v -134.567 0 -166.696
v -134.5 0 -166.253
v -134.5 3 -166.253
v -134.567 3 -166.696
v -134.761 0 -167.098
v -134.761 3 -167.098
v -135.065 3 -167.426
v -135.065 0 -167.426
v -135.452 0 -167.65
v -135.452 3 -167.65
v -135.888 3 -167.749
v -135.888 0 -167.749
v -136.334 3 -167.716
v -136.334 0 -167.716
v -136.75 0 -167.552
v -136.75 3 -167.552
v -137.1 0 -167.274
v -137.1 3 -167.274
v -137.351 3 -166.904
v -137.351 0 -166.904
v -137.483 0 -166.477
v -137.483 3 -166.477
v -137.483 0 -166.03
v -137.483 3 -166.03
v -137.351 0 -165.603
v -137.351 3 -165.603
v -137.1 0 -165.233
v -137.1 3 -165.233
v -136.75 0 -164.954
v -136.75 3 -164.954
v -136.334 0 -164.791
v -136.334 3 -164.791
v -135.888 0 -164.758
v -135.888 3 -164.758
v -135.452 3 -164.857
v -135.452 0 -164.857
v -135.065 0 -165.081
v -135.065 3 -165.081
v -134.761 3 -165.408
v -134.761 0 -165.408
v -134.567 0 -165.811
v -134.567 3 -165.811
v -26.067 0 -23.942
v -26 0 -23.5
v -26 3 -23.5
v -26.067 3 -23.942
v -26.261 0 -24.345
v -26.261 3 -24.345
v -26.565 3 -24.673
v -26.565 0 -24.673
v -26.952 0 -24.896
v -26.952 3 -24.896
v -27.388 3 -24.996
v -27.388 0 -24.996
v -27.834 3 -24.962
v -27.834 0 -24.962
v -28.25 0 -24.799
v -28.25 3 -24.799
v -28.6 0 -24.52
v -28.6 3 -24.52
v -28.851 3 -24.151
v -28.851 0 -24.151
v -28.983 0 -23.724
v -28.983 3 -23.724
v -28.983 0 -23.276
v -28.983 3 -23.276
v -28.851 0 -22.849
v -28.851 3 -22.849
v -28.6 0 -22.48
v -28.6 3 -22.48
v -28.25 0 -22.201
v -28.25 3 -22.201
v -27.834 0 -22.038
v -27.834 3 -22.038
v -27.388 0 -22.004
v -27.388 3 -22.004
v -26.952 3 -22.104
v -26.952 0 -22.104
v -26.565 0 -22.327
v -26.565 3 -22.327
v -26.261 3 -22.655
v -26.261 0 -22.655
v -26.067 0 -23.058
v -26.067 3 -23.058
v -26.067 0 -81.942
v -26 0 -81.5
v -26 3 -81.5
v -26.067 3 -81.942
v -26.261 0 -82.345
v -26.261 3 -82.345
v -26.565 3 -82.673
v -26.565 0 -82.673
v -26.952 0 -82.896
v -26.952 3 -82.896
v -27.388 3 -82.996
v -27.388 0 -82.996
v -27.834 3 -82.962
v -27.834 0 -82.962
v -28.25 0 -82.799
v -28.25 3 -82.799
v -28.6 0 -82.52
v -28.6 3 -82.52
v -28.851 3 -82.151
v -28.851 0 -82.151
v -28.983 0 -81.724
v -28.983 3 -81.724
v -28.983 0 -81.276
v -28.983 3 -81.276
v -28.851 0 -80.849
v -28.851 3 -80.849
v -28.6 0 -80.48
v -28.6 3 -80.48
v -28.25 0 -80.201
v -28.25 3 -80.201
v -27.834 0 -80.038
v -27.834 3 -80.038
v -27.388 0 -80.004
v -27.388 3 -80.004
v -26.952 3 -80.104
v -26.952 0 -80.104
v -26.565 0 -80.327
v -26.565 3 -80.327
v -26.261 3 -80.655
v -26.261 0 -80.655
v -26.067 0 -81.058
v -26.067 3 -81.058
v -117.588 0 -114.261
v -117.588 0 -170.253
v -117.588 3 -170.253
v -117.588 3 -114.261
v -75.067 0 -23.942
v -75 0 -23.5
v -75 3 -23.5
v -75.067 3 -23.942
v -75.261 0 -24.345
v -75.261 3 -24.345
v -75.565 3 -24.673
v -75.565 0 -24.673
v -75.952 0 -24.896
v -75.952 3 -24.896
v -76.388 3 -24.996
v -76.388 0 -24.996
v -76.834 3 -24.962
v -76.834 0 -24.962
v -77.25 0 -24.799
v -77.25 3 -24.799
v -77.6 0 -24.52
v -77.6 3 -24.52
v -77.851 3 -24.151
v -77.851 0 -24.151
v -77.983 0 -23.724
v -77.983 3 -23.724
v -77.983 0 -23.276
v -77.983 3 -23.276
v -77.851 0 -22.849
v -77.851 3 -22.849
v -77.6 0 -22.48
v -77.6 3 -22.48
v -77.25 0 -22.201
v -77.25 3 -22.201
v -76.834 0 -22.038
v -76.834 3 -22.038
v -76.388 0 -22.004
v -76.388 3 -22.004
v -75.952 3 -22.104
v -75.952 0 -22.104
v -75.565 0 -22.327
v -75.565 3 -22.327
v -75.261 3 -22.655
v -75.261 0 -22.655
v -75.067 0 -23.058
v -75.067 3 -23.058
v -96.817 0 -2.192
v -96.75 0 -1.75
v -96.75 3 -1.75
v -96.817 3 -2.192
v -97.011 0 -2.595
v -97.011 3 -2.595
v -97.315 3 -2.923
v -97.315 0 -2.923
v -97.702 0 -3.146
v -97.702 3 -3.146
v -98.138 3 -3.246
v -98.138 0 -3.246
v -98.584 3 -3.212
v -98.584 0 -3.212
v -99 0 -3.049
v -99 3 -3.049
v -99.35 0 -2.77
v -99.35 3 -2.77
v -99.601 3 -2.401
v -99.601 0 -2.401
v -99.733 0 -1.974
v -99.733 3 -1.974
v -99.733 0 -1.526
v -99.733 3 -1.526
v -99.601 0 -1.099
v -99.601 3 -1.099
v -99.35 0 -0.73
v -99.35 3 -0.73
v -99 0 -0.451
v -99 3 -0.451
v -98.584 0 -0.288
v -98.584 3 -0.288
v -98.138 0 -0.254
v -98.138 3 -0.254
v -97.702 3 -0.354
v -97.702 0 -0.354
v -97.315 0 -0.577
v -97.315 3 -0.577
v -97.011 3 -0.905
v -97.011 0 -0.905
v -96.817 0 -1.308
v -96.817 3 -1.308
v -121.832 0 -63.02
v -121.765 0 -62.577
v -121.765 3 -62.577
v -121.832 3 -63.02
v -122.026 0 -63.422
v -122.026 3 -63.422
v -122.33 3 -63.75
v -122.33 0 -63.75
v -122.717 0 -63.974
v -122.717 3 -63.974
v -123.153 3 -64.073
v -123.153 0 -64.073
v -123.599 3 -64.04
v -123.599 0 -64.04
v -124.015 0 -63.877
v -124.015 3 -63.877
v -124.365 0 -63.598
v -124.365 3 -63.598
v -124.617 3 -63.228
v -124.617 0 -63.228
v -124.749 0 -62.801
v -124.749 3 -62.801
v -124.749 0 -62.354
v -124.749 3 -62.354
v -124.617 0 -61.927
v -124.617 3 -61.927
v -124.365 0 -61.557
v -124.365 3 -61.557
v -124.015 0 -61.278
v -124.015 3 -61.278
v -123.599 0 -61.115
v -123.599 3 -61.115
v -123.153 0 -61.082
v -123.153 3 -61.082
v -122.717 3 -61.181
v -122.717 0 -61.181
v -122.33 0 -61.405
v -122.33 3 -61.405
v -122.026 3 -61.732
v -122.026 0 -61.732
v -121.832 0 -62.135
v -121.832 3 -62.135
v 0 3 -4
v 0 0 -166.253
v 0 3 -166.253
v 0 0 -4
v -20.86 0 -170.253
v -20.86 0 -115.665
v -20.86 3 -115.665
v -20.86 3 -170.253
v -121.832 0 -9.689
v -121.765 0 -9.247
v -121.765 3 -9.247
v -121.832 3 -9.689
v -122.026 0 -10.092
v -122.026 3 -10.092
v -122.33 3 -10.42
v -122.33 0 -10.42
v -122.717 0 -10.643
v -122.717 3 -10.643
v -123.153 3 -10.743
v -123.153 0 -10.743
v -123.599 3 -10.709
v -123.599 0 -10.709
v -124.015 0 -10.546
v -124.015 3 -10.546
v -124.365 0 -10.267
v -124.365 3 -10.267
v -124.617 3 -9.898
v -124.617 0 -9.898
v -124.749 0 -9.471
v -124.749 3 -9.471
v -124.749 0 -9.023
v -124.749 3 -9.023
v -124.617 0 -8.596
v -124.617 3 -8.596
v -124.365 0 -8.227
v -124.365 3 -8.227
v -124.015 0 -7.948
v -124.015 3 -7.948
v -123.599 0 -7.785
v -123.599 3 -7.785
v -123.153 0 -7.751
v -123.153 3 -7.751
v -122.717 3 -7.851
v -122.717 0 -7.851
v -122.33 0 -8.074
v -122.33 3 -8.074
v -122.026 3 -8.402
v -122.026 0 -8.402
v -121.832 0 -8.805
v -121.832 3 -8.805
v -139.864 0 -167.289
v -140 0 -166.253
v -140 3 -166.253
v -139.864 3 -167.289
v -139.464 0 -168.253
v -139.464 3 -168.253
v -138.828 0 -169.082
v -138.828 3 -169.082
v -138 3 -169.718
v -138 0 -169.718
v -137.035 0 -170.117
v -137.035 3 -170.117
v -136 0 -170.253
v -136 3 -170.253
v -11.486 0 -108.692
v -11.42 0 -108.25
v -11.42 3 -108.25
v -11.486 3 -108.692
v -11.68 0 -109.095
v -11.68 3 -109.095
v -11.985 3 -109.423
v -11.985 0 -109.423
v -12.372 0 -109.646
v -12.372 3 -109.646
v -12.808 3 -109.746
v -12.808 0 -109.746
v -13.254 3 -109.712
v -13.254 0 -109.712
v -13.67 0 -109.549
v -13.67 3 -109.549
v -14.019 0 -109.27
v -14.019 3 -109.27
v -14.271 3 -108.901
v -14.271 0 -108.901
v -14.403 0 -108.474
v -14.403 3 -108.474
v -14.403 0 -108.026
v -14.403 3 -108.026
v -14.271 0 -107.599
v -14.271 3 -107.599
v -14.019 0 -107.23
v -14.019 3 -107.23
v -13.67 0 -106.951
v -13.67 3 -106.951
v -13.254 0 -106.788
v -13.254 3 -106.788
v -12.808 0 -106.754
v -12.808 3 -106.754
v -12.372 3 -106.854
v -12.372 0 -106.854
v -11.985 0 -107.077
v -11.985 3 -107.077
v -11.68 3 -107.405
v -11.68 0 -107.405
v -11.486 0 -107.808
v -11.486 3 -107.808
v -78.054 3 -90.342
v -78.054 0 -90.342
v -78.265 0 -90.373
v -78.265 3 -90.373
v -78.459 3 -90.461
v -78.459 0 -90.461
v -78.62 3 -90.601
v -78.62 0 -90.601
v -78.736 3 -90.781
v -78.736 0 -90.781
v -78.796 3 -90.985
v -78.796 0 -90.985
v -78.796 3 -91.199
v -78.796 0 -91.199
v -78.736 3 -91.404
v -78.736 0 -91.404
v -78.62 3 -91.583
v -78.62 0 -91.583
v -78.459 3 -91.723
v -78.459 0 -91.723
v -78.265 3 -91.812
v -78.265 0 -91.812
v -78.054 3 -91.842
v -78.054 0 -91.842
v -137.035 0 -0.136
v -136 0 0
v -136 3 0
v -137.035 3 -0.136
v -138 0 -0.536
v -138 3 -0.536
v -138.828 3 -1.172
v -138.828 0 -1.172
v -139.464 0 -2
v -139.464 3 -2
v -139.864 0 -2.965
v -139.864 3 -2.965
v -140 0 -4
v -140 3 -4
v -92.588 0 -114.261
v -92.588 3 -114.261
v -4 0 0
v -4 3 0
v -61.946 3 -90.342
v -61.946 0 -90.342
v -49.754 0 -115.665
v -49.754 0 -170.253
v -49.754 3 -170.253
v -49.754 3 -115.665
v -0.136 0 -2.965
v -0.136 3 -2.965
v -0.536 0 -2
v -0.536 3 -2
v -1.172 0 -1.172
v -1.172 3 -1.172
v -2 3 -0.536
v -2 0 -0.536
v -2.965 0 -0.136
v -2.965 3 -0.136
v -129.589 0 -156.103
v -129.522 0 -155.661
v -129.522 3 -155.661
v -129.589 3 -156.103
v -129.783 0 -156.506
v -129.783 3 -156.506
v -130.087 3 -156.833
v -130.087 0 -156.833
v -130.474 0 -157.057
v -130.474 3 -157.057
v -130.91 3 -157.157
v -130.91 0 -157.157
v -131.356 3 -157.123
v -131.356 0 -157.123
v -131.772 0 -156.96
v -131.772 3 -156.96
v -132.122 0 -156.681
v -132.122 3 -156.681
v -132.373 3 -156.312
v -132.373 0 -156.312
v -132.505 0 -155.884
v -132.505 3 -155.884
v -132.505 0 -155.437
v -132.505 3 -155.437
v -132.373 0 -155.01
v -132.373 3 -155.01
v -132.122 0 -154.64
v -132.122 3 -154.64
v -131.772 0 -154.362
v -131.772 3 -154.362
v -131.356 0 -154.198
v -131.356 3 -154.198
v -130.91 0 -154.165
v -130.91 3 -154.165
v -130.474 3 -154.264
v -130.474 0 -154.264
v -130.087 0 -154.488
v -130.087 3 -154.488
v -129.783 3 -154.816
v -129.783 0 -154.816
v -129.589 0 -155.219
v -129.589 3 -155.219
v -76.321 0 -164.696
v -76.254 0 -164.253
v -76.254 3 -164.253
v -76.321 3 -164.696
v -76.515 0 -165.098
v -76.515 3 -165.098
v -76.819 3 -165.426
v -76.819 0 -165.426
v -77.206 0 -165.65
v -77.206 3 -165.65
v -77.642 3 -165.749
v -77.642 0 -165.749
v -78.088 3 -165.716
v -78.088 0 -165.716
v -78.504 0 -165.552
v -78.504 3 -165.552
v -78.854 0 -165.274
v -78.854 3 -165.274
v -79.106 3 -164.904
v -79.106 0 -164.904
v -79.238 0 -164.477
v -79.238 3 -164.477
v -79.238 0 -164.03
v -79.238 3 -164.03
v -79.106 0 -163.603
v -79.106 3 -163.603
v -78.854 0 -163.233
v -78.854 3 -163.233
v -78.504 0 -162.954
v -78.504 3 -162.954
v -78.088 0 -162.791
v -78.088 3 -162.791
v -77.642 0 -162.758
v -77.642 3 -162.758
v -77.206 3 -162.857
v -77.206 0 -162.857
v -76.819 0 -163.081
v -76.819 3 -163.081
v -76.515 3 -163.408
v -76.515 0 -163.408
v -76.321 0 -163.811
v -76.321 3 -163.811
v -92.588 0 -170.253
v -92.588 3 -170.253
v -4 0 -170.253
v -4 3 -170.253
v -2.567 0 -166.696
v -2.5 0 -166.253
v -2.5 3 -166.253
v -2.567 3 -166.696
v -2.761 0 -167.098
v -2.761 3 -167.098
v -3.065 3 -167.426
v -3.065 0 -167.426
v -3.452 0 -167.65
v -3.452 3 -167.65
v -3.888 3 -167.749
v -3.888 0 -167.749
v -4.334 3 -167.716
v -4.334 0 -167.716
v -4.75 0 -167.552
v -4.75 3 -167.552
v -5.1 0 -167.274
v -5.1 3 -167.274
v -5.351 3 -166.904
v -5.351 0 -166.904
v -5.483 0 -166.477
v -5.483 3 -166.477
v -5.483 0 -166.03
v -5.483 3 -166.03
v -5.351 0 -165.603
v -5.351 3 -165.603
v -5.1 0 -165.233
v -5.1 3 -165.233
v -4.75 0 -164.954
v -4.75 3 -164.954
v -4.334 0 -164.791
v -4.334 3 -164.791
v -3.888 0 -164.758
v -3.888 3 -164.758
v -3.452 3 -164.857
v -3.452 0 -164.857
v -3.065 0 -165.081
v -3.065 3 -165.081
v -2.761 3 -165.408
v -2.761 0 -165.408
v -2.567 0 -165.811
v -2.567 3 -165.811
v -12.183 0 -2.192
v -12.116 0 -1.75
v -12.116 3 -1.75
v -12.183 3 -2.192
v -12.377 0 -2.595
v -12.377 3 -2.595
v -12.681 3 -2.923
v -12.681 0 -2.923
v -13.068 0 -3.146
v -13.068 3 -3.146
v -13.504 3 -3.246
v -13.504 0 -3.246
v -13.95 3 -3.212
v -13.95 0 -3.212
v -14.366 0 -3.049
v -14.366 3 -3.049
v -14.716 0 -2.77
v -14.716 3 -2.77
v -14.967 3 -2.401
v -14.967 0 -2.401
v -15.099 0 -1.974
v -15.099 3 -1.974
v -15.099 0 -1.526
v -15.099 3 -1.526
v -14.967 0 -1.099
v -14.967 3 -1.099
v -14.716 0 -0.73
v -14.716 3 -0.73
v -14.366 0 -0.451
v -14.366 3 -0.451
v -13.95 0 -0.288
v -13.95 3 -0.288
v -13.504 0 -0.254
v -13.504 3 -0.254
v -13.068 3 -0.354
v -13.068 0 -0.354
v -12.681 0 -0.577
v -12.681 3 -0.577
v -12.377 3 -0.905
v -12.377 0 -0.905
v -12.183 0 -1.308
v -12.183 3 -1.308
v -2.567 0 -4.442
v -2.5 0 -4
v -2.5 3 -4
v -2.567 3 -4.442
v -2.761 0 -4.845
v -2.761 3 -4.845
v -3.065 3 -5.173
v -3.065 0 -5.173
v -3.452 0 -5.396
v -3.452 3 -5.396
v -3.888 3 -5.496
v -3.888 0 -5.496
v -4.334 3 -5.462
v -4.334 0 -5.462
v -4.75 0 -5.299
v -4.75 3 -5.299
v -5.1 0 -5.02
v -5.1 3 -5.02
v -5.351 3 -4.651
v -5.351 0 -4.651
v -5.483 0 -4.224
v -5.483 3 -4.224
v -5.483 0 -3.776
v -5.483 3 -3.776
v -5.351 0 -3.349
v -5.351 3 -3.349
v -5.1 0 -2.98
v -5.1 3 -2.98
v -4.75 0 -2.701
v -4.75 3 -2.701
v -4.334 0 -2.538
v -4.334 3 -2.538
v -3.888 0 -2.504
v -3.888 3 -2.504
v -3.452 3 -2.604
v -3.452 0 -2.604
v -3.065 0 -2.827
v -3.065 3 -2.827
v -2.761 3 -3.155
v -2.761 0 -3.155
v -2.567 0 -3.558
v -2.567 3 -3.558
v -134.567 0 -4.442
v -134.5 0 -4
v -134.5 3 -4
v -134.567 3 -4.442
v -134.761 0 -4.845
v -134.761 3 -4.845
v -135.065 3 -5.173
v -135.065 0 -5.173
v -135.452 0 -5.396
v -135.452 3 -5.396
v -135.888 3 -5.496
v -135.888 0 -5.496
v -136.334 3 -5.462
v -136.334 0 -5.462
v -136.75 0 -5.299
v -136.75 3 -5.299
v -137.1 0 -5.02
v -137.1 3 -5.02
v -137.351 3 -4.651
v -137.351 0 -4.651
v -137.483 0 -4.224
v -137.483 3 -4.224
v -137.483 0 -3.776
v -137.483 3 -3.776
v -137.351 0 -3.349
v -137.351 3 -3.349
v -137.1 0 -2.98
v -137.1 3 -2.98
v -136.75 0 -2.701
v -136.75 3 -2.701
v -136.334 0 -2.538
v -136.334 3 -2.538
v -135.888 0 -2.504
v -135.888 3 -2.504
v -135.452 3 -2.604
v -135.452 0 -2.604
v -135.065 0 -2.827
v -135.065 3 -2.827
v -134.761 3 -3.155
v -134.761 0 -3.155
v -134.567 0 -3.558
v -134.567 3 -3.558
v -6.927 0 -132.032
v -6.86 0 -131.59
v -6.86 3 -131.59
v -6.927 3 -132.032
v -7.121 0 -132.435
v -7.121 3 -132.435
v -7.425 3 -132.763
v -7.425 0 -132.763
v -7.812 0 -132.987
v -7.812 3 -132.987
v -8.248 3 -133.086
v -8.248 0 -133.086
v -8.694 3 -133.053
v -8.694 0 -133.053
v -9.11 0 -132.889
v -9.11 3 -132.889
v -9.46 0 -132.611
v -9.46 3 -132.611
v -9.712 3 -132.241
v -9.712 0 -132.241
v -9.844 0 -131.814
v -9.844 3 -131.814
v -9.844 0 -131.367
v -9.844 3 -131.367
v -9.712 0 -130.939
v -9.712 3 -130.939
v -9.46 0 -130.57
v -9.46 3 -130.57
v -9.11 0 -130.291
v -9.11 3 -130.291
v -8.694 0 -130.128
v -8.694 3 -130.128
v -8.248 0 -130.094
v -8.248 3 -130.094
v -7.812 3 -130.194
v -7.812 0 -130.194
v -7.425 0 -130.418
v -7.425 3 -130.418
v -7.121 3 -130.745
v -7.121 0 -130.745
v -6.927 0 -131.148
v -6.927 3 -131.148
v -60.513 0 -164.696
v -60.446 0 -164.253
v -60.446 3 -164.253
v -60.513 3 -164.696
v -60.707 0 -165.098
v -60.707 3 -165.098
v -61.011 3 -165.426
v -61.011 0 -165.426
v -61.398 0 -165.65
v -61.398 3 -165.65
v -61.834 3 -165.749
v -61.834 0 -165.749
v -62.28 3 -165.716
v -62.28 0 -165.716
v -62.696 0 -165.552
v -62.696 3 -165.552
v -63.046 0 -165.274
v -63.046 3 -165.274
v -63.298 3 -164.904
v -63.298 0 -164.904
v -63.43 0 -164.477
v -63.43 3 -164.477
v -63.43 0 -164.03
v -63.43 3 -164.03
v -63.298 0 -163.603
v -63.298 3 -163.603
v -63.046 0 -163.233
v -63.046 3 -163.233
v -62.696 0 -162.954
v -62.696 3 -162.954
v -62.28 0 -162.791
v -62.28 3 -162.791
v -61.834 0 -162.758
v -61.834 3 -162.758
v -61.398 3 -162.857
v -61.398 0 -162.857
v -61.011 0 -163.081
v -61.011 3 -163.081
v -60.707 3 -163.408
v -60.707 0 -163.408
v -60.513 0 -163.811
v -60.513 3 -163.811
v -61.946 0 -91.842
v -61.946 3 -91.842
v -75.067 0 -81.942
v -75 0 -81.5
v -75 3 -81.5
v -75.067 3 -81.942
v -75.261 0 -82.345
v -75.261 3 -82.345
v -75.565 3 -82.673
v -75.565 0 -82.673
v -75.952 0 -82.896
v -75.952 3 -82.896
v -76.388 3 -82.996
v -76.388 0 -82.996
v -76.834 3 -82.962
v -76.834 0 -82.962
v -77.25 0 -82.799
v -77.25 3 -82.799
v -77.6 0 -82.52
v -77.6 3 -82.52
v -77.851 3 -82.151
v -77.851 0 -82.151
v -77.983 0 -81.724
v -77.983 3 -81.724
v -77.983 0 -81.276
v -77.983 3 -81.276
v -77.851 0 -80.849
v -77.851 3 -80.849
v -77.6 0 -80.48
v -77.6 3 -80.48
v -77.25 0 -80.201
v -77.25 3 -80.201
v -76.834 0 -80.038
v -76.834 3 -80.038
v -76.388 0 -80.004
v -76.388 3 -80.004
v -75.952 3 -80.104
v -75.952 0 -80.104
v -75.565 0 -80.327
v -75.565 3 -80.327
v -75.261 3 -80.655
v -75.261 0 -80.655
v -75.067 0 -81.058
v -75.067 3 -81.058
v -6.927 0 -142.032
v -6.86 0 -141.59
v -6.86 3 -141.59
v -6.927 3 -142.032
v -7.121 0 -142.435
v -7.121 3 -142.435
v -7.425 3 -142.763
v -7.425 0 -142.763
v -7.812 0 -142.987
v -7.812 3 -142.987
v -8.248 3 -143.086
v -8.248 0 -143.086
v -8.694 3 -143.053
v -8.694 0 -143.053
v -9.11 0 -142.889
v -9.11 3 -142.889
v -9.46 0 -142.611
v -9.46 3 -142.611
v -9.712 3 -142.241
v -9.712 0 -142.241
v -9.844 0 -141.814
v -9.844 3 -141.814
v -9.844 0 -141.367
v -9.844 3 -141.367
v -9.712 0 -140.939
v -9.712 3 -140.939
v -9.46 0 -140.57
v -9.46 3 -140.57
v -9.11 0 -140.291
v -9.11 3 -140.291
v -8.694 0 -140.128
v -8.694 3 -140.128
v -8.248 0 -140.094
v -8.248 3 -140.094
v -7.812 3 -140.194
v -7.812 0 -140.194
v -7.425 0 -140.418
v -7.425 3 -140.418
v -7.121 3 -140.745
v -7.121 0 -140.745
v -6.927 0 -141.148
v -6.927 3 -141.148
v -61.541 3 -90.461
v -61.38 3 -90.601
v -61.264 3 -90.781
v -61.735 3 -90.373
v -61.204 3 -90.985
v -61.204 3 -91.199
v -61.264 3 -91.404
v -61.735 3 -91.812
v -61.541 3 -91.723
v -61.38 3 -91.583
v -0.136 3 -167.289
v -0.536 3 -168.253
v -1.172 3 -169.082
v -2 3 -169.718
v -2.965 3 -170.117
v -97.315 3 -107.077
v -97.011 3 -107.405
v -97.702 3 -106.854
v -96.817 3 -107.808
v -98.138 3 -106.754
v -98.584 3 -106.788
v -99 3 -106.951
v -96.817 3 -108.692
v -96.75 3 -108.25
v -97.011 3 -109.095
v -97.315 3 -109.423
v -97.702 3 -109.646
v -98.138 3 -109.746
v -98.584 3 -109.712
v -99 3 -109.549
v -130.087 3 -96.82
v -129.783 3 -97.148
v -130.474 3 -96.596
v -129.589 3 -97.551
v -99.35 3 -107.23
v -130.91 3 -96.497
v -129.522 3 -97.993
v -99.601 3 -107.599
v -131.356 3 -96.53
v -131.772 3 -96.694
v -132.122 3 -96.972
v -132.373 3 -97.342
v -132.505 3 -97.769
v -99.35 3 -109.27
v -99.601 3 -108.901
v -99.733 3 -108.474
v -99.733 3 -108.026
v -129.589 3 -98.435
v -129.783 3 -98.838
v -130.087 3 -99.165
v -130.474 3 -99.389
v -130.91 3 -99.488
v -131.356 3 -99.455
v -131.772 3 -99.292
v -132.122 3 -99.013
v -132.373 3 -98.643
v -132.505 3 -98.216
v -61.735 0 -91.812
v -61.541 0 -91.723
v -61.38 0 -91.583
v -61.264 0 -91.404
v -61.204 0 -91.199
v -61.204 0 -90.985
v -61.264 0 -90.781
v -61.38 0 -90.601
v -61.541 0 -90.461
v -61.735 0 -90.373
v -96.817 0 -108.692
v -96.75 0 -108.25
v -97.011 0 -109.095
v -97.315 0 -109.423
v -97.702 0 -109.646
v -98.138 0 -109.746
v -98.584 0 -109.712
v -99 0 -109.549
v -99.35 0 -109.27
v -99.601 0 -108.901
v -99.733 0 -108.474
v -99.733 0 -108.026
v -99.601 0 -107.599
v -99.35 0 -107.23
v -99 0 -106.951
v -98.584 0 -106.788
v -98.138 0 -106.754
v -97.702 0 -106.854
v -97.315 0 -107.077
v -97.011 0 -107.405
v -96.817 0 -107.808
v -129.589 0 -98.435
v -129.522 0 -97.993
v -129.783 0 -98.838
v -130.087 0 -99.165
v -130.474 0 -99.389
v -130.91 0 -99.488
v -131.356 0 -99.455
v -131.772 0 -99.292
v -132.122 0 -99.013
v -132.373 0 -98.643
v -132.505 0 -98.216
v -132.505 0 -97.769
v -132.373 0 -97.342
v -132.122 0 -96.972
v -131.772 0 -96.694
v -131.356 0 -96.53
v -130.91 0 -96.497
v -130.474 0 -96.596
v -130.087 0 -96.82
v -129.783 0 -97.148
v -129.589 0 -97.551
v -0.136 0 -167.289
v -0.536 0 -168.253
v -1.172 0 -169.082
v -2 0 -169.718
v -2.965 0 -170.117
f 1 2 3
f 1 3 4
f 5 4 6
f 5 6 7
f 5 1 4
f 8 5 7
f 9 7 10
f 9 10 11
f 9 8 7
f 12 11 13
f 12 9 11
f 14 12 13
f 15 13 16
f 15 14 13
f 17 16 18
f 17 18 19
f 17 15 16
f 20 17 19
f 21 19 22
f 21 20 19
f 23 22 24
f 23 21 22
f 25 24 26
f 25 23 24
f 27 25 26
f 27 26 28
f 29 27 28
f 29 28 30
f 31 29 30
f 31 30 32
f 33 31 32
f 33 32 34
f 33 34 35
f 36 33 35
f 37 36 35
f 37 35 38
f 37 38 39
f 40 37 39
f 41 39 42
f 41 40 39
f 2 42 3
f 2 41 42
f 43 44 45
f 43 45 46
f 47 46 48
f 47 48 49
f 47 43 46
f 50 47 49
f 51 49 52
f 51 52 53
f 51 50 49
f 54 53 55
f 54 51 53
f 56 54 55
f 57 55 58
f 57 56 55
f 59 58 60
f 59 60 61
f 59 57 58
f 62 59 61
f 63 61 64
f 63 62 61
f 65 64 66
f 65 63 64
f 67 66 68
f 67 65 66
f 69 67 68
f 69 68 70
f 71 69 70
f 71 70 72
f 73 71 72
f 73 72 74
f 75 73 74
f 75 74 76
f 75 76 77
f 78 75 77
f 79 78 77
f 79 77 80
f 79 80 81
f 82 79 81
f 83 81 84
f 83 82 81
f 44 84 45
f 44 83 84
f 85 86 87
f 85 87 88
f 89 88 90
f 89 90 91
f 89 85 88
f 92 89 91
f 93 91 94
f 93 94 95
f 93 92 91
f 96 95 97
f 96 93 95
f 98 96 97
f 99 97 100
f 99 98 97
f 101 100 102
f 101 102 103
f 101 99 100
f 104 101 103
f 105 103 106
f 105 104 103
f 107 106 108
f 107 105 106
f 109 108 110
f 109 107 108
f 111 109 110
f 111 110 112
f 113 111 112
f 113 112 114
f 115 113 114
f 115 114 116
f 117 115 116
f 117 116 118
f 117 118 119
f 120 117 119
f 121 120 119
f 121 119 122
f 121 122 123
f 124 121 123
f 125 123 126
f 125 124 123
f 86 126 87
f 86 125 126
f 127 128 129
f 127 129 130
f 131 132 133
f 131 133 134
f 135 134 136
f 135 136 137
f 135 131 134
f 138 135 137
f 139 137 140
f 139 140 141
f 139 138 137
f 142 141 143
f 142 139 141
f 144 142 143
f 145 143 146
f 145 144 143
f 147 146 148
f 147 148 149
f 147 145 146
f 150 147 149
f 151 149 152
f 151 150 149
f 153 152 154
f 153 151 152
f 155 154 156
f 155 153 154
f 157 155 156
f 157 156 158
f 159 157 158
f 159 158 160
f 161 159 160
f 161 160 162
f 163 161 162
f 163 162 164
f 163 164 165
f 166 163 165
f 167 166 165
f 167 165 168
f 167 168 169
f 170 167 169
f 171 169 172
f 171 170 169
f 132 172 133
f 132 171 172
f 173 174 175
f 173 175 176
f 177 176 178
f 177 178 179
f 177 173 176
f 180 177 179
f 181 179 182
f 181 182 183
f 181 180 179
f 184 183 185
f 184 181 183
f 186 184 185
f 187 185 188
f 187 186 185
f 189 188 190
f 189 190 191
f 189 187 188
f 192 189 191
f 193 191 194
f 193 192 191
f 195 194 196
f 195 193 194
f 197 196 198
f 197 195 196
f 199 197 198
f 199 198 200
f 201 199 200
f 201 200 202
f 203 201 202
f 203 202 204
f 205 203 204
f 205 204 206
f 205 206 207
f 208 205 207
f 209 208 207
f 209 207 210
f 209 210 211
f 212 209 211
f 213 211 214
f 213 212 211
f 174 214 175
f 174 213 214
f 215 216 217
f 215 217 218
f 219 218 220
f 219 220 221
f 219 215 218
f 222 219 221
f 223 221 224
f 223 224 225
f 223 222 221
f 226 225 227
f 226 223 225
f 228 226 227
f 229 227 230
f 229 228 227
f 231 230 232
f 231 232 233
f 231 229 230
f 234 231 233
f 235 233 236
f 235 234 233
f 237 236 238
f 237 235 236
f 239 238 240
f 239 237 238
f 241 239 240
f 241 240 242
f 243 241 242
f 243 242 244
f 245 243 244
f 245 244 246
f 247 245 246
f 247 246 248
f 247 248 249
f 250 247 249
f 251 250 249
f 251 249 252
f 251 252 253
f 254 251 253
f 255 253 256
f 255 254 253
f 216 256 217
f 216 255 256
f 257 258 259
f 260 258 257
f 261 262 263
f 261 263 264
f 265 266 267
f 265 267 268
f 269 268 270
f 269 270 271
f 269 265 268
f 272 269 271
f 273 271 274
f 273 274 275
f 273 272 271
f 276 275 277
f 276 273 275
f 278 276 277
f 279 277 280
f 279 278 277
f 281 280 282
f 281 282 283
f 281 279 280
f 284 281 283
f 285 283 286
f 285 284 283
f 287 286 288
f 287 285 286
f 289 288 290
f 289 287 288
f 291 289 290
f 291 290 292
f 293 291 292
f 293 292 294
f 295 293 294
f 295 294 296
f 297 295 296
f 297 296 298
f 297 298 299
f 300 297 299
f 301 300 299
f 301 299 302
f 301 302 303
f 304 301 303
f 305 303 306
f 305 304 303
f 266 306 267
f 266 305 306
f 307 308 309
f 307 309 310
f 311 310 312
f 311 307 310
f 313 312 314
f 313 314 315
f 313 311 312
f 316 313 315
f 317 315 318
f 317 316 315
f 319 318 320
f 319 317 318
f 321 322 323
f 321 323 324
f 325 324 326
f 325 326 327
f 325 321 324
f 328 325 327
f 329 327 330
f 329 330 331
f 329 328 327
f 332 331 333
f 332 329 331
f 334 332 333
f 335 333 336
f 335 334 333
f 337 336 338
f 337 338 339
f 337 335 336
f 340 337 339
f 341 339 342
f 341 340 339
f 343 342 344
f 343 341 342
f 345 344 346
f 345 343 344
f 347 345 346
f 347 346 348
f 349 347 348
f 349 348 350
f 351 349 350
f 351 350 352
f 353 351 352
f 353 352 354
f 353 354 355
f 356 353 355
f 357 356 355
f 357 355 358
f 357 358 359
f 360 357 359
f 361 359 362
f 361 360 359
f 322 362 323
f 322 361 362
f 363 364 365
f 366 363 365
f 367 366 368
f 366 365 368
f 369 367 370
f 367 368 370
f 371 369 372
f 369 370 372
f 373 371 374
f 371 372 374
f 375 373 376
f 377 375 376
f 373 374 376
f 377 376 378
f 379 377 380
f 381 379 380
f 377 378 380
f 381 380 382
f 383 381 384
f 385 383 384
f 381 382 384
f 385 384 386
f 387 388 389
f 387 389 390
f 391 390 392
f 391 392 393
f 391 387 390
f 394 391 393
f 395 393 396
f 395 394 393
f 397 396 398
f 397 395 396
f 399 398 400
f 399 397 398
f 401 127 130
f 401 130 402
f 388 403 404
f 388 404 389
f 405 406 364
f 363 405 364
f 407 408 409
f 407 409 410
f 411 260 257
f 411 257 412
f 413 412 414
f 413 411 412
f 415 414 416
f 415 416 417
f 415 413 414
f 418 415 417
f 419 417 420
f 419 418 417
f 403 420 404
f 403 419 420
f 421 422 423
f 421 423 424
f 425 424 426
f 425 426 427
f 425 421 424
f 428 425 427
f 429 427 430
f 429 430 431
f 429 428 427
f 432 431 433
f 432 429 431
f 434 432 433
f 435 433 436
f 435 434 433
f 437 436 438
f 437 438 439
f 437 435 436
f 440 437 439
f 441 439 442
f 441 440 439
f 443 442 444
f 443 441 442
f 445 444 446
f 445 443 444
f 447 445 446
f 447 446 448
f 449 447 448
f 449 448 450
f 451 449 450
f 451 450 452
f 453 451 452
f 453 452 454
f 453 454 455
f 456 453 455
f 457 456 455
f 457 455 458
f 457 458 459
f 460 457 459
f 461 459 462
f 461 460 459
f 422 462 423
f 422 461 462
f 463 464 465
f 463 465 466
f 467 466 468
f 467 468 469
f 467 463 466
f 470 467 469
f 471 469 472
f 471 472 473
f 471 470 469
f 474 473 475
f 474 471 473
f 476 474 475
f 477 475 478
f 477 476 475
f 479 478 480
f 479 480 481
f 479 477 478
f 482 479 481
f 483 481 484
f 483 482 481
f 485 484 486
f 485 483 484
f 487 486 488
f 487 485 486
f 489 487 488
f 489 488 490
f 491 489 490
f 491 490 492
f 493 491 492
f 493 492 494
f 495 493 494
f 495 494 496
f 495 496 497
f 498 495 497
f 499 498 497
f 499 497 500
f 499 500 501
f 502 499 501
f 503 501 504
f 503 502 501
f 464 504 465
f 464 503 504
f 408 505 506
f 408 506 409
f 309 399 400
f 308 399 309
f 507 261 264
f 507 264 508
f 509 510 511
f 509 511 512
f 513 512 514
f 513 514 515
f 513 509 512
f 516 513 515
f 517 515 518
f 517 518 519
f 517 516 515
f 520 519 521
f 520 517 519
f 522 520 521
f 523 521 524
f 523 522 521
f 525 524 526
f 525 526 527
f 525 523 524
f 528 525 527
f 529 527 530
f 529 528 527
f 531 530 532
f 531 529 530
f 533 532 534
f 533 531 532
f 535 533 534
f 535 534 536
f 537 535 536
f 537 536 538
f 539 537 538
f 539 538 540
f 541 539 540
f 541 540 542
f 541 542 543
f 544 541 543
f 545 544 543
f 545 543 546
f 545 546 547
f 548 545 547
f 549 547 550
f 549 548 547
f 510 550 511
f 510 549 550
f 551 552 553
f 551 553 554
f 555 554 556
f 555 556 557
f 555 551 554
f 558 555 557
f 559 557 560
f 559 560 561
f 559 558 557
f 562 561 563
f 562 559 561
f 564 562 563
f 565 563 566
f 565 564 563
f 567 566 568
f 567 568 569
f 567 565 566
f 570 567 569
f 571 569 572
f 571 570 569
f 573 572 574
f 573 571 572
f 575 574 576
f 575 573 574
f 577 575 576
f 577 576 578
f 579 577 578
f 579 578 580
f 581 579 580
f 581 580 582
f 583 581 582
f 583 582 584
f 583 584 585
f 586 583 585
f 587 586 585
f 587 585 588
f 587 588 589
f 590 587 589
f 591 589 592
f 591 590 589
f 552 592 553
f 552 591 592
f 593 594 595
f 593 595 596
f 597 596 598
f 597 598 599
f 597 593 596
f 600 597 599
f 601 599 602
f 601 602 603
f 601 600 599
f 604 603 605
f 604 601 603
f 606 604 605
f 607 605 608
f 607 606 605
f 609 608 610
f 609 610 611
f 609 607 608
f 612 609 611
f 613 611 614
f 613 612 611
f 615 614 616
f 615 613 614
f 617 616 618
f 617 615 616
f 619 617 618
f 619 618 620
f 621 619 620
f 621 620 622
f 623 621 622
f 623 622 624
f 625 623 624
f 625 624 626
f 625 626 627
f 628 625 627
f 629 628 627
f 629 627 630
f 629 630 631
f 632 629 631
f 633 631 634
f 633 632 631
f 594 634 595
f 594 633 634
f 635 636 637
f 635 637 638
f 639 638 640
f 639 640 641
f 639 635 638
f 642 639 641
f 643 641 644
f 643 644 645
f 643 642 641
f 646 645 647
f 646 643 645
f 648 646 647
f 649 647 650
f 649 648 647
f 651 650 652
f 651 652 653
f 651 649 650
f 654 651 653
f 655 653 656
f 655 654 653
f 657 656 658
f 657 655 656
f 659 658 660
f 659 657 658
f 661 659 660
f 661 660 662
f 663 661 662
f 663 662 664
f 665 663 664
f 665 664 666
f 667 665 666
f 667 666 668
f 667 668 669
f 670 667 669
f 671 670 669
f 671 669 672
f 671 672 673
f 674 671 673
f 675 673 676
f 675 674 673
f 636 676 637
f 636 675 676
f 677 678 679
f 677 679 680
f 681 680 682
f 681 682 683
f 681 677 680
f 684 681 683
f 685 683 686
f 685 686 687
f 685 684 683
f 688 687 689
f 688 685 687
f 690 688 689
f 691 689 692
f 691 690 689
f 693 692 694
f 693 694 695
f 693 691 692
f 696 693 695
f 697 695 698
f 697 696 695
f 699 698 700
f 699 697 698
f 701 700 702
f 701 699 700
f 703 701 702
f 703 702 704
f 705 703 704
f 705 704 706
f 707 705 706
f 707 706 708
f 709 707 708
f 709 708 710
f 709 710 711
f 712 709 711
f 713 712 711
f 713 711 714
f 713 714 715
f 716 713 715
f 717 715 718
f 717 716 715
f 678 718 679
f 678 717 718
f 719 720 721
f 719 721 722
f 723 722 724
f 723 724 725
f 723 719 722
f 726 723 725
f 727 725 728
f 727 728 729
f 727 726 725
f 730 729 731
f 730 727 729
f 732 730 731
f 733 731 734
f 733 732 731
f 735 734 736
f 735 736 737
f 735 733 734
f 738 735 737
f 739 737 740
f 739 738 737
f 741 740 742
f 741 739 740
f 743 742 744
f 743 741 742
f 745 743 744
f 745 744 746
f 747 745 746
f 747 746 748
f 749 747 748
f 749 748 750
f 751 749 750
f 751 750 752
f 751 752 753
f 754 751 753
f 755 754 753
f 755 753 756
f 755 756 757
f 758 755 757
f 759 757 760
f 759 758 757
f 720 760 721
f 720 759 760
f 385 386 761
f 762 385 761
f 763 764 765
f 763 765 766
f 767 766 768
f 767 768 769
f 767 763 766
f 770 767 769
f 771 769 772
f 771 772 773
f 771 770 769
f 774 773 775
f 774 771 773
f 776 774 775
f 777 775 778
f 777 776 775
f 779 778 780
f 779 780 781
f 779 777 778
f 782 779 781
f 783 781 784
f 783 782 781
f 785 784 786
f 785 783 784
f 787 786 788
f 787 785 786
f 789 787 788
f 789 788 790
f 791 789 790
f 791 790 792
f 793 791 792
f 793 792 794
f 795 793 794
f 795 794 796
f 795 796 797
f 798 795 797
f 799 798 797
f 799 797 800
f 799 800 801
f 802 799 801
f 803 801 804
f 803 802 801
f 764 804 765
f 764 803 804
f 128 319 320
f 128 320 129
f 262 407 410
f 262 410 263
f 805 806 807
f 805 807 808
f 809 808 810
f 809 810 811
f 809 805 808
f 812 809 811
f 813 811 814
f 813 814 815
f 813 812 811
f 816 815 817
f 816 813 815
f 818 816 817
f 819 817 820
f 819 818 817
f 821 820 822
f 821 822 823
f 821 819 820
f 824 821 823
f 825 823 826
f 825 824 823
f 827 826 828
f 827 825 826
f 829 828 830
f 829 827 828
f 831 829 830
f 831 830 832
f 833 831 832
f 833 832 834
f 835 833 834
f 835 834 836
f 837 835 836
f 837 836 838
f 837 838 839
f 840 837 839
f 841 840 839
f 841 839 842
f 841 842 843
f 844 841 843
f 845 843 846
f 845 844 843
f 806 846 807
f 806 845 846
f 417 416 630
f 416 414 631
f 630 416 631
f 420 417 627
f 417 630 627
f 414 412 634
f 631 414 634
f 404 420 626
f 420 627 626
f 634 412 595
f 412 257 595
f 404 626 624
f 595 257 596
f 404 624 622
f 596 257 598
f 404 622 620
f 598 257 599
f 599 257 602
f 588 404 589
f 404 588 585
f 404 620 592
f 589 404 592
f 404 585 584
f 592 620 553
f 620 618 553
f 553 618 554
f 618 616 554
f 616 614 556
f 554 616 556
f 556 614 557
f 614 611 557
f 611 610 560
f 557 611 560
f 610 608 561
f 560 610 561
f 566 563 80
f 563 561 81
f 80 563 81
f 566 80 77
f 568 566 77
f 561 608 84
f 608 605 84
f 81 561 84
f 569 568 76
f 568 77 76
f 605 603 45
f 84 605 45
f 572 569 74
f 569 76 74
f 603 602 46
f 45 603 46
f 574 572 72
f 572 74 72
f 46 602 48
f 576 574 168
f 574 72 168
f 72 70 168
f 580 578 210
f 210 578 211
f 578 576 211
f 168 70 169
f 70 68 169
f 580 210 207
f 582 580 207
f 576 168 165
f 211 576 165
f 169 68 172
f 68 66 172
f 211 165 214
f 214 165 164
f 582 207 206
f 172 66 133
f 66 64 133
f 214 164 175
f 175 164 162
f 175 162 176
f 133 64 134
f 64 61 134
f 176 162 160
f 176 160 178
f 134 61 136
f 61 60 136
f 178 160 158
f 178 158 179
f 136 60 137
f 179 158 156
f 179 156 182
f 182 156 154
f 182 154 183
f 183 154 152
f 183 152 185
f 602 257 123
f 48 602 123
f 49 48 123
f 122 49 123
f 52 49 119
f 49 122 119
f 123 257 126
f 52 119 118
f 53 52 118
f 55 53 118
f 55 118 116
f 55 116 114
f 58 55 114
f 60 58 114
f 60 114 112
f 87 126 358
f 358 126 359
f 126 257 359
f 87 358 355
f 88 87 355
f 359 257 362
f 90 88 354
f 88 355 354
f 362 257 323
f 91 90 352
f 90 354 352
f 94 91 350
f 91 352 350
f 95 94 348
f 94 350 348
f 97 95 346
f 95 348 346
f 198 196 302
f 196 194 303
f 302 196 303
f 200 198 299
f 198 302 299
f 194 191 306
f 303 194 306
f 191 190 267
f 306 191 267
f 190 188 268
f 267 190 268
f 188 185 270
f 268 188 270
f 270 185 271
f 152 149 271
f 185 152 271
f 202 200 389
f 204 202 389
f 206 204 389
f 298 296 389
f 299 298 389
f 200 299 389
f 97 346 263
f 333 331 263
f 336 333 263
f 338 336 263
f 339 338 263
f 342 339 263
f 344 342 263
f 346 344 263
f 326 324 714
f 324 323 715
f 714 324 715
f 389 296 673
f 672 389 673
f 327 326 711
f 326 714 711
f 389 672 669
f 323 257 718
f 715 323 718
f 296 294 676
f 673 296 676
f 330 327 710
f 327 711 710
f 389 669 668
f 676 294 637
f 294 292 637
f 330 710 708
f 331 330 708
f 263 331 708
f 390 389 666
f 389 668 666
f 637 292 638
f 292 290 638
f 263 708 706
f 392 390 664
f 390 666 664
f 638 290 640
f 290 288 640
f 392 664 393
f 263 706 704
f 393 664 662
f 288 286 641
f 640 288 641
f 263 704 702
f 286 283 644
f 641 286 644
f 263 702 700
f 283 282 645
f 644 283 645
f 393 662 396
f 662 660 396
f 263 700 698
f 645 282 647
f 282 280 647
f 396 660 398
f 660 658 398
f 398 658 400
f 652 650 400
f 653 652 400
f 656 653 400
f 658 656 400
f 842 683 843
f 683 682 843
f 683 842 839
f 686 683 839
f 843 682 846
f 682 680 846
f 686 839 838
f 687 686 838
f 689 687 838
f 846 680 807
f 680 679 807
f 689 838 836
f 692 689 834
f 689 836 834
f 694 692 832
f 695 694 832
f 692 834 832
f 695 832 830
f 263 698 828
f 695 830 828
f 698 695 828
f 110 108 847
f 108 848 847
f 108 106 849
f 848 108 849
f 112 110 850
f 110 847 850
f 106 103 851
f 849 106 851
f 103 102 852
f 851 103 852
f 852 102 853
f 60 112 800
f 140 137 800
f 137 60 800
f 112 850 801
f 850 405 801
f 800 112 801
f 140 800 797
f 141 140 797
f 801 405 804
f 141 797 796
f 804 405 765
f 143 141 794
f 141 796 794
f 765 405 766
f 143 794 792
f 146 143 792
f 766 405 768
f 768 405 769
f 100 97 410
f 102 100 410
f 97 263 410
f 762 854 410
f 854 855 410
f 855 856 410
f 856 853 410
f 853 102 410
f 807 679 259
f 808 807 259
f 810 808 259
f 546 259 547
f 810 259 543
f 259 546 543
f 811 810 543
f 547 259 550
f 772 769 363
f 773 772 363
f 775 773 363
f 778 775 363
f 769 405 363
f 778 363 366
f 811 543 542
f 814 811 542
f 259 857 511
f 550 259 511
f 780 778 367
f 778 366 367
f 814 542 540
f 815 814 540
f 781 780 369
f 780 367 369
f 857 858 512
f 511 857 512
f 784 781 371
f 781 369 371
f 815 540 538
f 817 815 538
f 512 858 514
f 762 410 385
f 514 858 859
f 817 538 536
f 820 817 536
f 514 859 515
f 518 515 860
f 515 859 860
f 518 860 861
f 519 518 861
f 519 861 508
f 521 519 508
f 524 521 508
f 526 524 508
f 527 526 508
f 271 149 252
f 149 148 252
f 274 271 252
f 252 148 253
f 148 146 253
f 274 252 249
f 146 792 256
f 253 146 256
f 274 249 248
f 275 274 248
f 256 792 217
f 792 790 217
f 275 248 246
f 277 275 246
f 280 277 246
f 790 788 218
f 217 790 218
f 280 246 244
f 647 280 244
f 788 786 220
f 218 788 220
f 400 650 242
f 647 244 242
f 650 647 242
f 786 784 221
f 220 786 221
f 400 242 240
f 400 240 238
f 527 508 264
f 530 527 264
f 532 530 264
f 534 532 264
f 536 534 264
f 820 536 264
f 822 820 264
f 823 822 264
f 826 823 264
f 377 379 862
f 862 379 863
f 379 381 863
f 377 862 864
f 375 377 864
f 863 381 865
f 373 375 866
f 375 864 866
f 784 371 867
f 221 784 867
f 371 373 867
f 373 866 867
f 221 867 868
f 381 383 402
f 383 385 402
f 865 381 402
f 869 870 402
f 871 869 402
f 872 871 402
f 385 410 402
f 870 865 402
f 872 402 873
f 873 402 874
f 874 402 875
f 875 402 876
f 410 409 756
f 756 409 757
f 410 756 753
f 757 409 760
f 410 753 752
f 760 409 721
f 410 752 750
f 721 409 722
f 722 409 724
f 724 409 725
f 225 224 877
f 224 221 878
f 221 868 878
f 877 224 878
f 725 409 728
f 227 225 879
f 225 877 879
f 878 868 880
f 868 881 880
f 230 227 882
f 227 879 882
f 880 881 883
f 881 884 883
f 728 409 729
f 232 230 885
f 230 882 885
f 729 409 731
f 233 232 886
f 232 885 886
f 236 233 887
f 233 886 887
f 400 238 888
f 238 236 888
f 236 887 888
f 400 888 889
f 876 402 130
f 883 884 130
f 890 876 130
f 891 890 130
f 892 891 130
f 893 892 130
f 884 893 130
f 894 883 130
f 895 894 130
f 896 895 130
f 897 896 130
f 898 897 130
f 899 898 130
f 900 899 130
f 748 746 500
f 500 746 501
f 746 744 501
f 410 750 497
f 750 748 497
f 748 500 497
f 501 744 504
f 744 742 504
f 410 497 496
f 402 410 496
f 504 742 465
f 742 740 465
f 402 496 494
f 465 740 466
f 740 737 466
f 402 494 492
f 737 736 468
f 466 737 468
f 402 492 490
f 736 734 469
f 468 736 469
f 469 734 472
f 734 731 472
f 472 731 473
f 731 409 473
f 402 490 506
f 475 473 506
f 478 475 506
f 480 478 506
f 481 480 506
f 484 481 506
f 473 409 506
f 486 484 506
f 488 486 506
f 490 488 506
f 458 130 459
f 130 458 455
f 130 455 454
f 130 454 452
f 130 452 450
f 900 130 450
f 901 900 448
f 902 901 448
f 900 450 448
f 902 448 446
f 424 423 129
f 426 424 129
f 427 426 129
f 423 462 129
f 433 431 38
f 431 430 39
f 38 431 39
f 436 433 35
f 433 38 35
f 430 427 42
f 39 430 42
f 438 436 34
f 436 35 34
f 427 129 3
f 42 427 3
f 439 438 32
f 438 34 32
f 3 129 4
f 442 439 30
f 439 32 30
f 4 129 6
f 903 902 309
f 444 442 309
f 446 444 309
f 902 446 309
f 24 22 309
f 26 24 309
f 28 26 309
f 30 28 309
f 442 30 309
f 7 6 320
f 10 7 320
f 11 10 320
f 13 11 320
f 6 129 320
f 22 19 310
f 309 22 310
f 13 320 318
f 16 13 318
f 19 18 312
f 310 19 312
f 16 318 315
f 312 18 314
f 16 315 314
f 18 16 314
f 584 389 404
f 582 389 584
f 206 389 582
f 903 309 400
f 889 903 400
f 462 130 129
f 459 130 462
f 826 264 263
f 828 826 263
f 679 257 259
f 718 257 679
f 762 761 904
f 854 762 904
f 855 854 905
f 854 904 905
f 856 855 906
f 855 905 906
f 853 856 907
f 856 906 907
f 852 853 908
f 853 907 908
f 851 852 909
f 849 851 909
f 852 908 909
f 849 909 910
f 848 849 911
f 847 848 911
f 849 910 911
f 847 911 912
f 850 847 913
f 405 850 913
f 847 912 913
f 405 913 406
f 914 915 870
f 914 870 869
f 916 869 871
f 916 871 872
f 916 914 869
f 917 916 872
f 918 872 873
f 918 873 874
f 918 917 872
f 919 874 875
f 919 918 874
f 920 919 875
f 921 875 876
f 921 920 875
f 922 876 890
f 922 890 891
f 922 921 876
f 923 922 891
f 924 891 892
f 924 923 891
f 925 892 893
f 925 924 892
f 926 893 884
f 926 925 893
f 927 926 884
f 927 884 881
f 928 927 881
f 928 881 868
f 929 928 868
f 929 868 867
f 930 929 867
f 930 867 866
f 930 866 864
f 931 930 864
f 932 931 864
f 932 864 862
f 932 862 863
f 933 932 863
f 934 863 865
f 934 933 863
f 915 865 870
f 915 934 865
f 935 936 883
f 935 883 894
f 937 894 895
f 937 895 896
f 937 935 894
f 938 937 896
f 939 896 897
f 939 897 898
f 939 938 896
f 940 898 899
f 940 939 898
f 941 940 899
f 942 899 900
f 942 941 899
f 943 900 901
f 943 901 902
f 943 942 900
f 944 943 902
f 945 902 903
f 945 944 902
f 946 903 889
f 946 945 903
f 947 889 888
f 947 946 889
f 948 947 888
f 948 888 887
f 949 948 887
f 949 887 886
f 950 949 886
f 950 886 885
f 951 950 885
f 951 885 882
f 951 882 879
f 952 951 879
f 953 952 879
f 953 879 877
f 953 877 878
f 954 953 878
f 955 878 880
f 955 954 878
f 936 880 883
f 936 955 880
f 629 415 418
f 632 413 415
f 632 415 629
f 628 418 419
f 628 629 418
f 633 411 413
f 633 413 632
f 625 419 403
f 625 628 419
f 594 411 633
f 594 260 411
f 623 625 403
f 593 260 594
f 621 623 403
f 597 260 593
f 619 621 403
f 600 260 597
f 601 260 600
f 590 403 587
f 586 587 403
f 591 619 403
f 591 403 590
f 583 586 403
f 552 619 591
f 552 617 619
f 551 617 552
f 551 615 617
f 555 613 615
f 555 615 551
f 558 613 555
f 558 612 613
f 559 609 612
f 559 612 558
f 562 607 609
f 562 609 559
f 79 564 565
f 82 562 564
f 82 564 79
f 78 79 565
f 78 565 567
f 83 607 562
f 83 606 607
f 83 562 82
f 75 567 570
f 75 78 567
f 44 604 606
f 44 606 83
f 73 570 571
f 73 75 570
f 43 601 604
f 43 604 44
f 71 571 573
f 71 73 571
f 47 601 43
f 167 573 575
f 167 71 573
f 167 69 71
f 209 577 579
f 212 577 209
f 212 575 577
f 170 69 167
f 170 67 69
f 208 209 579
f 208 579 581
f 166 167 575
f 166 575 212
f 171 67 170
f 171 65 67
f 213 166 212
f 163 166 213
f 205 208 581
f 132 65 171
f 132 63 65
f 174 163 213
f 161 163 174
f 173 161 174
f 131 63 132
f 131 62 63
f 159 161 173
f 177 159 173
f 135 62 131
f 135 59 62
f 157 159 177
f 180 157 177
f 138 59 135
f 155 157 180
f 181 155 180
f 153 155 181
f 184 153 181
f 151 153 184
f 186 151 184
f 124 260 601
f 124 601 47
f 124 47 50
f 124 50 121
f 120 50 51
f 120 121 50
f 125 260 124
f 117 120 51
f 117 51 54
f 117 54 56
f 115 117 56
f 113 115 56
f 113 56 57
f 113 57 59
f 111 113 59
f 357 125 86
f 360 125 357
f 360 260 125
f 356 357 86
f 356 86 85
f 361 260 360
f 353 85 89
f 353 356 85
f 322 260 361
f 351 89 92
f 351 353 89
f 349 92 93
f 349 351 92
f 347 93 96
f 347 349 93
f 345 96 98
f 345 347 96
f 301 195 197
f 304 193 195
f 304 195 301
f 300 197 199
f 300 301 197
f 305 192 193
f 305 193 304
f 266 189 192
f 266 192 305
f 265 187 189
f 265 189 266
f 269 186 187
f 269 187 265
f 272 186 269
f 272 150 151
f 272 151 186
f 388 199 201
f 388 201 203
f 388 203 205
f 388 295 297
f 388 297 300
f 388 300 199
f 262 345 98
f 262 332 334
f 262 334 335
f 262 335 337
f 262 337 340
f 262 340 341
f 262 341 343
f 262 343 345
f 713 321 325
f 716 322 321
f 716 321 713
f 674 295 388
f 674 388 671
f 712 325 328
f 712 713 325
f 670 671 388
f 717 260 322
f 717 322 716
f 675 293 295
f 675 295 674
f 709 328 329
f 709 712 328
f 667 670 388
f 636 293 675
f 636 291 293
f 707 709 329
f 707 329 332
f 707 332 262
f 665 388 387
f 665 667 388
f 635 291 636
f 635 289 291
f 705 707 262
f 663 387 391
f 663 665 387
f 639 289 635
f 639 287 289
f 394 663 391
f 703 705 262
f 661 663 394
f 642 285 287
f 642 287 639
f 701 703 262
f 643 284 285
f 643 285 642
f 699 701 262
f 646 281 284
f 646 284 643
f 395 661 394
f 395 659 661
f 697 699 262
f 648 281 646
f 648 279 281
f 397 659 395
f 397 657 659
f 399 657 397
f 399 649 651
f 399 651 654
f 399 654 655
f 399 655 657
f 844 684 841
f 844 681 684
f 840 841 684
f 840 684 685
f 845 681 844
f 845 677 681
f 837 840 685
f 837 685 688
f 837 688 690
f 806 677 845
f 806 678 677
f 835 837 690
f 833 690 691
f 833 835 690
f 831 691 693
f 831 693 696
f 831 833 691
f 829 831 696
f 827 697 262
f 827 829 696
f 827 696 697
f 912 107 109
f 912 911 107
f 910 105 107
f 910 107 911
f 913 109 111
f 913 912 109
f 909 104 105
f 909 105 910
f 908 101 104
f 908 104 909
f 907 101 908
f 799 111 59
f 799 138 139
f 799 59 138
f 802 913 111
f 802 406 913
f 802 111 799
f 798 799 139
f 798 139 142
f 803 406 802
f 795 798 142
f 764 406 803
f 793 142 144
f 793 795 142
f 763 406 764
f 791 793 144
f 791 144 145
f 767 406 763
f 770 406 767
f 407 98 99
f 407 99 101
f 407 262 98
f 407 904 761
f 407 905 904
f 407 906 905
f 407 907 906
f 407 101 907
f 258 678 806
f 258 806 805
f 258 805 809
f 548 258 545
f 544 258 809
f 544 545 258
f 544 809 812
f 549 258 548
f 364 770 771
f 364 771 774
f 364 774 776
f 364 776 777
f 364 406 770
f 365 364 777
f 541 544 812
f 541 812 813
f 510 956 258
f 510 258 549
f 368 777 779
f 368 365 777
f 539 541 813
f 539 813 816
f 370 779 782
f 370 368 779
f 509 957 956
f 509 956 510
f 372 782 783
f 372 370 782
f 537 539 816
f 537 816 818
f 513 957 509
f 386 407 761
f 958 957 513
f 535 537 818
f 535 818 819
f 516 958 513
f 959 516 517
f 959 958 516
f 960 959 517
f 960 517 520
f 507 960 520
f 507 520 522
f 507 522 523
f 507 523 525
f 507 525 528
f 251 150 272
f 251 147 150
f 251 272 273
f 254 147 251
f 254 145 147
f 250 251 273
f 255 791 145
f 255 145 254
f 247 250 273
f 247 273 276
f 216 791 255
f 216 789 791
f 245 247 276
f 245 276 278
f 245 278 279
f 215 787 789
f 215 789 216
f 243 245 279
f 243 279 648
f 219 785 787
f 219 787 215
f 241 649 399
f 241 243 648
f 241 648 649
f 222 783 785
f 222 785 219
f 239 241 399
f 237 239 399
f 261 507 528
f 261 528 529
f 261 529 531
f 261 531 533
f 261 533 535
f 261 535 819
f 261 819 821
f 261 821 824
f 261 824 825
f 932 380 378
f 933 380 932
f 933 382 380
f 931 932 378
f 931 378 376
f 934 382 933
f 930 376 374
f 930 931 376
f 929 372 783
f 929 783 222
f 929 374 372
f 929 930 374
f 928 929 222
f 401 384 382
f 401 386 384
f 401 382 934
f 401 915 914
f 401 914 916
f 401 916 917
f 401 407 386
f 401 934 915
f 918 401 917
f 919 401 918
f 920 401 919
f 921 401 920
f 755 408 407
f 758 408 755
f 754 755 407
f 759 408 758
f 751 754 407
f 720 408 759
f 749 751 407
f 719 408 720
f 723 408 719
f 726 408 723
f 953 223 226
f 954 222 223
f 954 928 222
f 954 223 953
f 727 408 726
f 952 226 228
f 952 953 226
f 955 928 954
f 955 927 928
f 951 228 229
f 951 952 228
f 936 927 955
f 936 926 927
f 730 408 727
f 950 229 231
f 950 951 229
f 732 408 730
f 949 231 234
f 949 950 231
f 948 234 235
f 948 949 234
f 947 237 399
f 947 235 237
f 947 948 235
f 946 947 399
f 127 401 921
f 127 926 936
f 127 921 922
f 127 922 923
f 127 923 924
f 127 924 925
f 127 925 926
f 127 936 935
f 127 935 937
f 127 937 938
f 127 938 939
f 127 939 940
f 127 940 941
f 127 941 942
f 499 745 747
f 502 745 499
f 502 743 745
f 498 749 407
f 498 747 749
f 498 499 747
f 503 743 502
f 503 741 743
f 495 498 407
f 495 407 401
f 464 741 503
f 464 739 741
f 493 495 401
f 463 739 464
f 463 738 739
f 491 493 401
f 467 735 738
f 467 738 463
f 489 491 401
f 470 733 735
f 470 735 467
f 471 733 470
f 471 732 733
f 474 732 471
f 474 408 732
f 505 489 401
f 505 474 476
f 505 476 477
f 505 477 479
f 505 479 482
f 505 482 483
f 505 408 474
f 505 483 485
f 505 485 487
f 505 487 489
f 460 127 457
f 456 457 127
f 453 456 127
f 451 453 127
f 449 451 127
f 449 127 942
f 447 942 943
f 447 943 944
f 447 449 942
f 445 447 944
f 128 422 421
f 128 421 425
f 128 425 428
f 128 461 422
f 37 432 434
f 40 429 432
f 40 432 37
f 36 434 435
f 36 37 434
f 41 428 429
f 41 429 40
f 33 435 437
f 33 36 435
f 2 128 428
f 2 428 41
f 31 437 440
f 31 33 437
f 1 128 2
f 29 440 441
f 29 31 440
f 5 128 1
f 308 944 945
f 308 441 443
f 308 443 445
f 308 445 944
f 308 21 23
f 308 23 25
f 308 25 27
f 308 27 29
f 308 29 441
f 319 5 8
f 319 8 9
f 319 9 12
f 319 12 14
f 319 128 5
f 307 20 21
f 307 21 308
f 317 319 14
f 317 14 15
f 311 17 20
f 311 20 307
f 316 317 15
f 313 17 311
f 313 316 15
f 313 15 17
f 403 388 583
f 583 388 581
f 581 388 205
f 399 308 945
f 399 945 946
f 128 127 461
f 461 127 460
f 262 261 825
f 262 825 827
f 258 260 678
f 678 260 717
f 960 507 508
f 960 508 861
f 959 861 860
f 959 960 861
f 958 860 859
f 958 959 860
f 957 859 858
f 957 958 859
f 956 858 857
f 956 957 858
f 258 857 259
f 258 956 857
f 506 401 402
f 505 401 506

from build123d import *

# Parameters (mm, degrees)
SKETCH1_R           = 1.5
BOSS_EXTRUDE1_DEPTH = 3


with BuildPart() as part:
    # Sketch1 → Boss-Extrude1 (new body)
    with BuildSketch(Plane(origin=(0, 0, 0), x_dir=(1, 0, 0), z_dir=(0, 1, 0))):
        with BuildLine():
            Line((-4, 0), (-136, 0))
            ThreePointArc((-136, 0), (-138.828427125, 1.171572875), (-140, 4))
            Line((-140, 4), (-140, 166.25343074))
            ThreePointArc((-140, 166.25343074), (-138.828427125, 169.081857865), (-136, 170.25343074))
            Line((-136, 170.25343074), (-117.588107797, 170.25343074))
            Line((-117.588107797, 170.25343074), (-117.588107797, 114.261134971))
            Line((-117.588107797, 114.261134971), (-92.588107797, 114.261134971))
            Line((-92.588107797, 114.261134971), (-92.588107797, 170.25343074))
            Line((-92.588107797, 170.25343074), (-49.754336385, 170.25343074))
            Line((-49.754336385, 170.25343074), (-49.754336385, 115.66527195))
            Line((-49.754336385, 115.66527195), (-20.860369091, 115.66527195))
            Line((-20.860369091, 115.66527195), (-20.860369091, 170.25343074))
            Line((-20.860369091, 170.25343074), (-4, 170.25343074))
            ThreePointArc((-4, 170.25343074), (-1.171572875, 169.081857865), (0, 166.25343074))
            Line((0, 166.25343074), (0, 4))
            ThreePointArc((0, 4), (-1.171572875, 1.171572875), (-4, 0))
        make_face()
        with Locations((-136, 166.25343074)):
            Circle(SKETCH1_R, mode=Mode.SUBTRACT)
        with Locations((-4, 166.25343074)):
            Circle(SKETCH1_R, mode=Mode.SUBTRACT)
        with Locations((-136, 4)):
            Circle(SKETCH1_R, mode=Mode.SUBTRACT)
        with Locations((-4, 4)):
            Circle(SKETCH1_R, mode=Mode.SUBTRACT)
        with Locations((-8.360369091, 141.5902664)):
            Circle(SKETCH1_R, mode=Mode.SUBTRACT)
        with Locations((-8.360369091, 131.5902664)):
            Circle(SKETCH1_R, mode=Mode.SUBTRACT)
        with Locations((-123.265486726, 62.577470458)):
            Circle(SKETCH1_R, mode=Mode.SUBTRACT)
        with Locations((-123.265486726, 9.24694437)):
            Circle(SKETCH1_R, mode=Mode.SUBTRACT)
        with Locations((-61.946271424, 164.25343074)):
            Circle(SKETCH1_R, mode=Mode.SUBTRACT)
        with Locations((-77.75445726, 164.25343074)):
            Circle(SKETCH1_R, mode=Mode.SUBTRACT)
        with Locations((-131.022006432, 155.660698945)):
            Circle(SKETCH1_R, mode=Mode.SUBTRACT)
        with Locations((-131.022006432, 97.992651369)):
            Circle(SKETCH1_R, mode=Mode.SUBTRACT)
        with Locations((-27.5, 81.5)):
            Circle(SKETCH1_R, mode=Mode.SUBTRACT)
        with Locations((-76.5, 81.5)):
            Circle(SKETCH1_R, mode=Mode.SUBTRACT)
        with Locations((-27.5, 23.5)):
            Circle(SKETCH1_R, mode=Mode.SUBTRACT)
        with Locations((-76.5, 23.5)):
            Circle(SKETCH1_R, mode=Mode.SUBTRACT)
        with Locations((-98.25, 108.25)):
            Circle(SKETCH1_R, mode=Mode.SUBTRACT)
        with Locations((-12.919798313, 108.25)):
            Circle(SKETCH1_R, mode=Mode.SUBTRACT)
        with Locations((-98.25, 1.75)):
            Circle(SKETCH1_R, mode=Mode.SUBTRACT)
        with Locations((-13.615959215, 1.75)):
            Circle(SKETCH1_R, mode=Mode.SUBTRACT)
        with BuildLine():
            Line((-78.053728576, 91.841911577), (-61.946271424, 91.841911577))
            ThreePointArc((-61.946271424, 91.841911577), (-61.196519269, 91.092159423), (-61.946271424, 90.342407268))
            Line((-61.946271424, 90.342407268), (-78.053728576, 90.342407268))
            ThreePointArc((-78.053728576, 90.342407268), (-78.803480731, 91.092159423), (-78.053728576, 91.841911577))
        make_face(mode=Mode.SUBTRACT)
    extrude(amount=BOSS_EXTRUDE1_DEPTH)


solid = part.part
